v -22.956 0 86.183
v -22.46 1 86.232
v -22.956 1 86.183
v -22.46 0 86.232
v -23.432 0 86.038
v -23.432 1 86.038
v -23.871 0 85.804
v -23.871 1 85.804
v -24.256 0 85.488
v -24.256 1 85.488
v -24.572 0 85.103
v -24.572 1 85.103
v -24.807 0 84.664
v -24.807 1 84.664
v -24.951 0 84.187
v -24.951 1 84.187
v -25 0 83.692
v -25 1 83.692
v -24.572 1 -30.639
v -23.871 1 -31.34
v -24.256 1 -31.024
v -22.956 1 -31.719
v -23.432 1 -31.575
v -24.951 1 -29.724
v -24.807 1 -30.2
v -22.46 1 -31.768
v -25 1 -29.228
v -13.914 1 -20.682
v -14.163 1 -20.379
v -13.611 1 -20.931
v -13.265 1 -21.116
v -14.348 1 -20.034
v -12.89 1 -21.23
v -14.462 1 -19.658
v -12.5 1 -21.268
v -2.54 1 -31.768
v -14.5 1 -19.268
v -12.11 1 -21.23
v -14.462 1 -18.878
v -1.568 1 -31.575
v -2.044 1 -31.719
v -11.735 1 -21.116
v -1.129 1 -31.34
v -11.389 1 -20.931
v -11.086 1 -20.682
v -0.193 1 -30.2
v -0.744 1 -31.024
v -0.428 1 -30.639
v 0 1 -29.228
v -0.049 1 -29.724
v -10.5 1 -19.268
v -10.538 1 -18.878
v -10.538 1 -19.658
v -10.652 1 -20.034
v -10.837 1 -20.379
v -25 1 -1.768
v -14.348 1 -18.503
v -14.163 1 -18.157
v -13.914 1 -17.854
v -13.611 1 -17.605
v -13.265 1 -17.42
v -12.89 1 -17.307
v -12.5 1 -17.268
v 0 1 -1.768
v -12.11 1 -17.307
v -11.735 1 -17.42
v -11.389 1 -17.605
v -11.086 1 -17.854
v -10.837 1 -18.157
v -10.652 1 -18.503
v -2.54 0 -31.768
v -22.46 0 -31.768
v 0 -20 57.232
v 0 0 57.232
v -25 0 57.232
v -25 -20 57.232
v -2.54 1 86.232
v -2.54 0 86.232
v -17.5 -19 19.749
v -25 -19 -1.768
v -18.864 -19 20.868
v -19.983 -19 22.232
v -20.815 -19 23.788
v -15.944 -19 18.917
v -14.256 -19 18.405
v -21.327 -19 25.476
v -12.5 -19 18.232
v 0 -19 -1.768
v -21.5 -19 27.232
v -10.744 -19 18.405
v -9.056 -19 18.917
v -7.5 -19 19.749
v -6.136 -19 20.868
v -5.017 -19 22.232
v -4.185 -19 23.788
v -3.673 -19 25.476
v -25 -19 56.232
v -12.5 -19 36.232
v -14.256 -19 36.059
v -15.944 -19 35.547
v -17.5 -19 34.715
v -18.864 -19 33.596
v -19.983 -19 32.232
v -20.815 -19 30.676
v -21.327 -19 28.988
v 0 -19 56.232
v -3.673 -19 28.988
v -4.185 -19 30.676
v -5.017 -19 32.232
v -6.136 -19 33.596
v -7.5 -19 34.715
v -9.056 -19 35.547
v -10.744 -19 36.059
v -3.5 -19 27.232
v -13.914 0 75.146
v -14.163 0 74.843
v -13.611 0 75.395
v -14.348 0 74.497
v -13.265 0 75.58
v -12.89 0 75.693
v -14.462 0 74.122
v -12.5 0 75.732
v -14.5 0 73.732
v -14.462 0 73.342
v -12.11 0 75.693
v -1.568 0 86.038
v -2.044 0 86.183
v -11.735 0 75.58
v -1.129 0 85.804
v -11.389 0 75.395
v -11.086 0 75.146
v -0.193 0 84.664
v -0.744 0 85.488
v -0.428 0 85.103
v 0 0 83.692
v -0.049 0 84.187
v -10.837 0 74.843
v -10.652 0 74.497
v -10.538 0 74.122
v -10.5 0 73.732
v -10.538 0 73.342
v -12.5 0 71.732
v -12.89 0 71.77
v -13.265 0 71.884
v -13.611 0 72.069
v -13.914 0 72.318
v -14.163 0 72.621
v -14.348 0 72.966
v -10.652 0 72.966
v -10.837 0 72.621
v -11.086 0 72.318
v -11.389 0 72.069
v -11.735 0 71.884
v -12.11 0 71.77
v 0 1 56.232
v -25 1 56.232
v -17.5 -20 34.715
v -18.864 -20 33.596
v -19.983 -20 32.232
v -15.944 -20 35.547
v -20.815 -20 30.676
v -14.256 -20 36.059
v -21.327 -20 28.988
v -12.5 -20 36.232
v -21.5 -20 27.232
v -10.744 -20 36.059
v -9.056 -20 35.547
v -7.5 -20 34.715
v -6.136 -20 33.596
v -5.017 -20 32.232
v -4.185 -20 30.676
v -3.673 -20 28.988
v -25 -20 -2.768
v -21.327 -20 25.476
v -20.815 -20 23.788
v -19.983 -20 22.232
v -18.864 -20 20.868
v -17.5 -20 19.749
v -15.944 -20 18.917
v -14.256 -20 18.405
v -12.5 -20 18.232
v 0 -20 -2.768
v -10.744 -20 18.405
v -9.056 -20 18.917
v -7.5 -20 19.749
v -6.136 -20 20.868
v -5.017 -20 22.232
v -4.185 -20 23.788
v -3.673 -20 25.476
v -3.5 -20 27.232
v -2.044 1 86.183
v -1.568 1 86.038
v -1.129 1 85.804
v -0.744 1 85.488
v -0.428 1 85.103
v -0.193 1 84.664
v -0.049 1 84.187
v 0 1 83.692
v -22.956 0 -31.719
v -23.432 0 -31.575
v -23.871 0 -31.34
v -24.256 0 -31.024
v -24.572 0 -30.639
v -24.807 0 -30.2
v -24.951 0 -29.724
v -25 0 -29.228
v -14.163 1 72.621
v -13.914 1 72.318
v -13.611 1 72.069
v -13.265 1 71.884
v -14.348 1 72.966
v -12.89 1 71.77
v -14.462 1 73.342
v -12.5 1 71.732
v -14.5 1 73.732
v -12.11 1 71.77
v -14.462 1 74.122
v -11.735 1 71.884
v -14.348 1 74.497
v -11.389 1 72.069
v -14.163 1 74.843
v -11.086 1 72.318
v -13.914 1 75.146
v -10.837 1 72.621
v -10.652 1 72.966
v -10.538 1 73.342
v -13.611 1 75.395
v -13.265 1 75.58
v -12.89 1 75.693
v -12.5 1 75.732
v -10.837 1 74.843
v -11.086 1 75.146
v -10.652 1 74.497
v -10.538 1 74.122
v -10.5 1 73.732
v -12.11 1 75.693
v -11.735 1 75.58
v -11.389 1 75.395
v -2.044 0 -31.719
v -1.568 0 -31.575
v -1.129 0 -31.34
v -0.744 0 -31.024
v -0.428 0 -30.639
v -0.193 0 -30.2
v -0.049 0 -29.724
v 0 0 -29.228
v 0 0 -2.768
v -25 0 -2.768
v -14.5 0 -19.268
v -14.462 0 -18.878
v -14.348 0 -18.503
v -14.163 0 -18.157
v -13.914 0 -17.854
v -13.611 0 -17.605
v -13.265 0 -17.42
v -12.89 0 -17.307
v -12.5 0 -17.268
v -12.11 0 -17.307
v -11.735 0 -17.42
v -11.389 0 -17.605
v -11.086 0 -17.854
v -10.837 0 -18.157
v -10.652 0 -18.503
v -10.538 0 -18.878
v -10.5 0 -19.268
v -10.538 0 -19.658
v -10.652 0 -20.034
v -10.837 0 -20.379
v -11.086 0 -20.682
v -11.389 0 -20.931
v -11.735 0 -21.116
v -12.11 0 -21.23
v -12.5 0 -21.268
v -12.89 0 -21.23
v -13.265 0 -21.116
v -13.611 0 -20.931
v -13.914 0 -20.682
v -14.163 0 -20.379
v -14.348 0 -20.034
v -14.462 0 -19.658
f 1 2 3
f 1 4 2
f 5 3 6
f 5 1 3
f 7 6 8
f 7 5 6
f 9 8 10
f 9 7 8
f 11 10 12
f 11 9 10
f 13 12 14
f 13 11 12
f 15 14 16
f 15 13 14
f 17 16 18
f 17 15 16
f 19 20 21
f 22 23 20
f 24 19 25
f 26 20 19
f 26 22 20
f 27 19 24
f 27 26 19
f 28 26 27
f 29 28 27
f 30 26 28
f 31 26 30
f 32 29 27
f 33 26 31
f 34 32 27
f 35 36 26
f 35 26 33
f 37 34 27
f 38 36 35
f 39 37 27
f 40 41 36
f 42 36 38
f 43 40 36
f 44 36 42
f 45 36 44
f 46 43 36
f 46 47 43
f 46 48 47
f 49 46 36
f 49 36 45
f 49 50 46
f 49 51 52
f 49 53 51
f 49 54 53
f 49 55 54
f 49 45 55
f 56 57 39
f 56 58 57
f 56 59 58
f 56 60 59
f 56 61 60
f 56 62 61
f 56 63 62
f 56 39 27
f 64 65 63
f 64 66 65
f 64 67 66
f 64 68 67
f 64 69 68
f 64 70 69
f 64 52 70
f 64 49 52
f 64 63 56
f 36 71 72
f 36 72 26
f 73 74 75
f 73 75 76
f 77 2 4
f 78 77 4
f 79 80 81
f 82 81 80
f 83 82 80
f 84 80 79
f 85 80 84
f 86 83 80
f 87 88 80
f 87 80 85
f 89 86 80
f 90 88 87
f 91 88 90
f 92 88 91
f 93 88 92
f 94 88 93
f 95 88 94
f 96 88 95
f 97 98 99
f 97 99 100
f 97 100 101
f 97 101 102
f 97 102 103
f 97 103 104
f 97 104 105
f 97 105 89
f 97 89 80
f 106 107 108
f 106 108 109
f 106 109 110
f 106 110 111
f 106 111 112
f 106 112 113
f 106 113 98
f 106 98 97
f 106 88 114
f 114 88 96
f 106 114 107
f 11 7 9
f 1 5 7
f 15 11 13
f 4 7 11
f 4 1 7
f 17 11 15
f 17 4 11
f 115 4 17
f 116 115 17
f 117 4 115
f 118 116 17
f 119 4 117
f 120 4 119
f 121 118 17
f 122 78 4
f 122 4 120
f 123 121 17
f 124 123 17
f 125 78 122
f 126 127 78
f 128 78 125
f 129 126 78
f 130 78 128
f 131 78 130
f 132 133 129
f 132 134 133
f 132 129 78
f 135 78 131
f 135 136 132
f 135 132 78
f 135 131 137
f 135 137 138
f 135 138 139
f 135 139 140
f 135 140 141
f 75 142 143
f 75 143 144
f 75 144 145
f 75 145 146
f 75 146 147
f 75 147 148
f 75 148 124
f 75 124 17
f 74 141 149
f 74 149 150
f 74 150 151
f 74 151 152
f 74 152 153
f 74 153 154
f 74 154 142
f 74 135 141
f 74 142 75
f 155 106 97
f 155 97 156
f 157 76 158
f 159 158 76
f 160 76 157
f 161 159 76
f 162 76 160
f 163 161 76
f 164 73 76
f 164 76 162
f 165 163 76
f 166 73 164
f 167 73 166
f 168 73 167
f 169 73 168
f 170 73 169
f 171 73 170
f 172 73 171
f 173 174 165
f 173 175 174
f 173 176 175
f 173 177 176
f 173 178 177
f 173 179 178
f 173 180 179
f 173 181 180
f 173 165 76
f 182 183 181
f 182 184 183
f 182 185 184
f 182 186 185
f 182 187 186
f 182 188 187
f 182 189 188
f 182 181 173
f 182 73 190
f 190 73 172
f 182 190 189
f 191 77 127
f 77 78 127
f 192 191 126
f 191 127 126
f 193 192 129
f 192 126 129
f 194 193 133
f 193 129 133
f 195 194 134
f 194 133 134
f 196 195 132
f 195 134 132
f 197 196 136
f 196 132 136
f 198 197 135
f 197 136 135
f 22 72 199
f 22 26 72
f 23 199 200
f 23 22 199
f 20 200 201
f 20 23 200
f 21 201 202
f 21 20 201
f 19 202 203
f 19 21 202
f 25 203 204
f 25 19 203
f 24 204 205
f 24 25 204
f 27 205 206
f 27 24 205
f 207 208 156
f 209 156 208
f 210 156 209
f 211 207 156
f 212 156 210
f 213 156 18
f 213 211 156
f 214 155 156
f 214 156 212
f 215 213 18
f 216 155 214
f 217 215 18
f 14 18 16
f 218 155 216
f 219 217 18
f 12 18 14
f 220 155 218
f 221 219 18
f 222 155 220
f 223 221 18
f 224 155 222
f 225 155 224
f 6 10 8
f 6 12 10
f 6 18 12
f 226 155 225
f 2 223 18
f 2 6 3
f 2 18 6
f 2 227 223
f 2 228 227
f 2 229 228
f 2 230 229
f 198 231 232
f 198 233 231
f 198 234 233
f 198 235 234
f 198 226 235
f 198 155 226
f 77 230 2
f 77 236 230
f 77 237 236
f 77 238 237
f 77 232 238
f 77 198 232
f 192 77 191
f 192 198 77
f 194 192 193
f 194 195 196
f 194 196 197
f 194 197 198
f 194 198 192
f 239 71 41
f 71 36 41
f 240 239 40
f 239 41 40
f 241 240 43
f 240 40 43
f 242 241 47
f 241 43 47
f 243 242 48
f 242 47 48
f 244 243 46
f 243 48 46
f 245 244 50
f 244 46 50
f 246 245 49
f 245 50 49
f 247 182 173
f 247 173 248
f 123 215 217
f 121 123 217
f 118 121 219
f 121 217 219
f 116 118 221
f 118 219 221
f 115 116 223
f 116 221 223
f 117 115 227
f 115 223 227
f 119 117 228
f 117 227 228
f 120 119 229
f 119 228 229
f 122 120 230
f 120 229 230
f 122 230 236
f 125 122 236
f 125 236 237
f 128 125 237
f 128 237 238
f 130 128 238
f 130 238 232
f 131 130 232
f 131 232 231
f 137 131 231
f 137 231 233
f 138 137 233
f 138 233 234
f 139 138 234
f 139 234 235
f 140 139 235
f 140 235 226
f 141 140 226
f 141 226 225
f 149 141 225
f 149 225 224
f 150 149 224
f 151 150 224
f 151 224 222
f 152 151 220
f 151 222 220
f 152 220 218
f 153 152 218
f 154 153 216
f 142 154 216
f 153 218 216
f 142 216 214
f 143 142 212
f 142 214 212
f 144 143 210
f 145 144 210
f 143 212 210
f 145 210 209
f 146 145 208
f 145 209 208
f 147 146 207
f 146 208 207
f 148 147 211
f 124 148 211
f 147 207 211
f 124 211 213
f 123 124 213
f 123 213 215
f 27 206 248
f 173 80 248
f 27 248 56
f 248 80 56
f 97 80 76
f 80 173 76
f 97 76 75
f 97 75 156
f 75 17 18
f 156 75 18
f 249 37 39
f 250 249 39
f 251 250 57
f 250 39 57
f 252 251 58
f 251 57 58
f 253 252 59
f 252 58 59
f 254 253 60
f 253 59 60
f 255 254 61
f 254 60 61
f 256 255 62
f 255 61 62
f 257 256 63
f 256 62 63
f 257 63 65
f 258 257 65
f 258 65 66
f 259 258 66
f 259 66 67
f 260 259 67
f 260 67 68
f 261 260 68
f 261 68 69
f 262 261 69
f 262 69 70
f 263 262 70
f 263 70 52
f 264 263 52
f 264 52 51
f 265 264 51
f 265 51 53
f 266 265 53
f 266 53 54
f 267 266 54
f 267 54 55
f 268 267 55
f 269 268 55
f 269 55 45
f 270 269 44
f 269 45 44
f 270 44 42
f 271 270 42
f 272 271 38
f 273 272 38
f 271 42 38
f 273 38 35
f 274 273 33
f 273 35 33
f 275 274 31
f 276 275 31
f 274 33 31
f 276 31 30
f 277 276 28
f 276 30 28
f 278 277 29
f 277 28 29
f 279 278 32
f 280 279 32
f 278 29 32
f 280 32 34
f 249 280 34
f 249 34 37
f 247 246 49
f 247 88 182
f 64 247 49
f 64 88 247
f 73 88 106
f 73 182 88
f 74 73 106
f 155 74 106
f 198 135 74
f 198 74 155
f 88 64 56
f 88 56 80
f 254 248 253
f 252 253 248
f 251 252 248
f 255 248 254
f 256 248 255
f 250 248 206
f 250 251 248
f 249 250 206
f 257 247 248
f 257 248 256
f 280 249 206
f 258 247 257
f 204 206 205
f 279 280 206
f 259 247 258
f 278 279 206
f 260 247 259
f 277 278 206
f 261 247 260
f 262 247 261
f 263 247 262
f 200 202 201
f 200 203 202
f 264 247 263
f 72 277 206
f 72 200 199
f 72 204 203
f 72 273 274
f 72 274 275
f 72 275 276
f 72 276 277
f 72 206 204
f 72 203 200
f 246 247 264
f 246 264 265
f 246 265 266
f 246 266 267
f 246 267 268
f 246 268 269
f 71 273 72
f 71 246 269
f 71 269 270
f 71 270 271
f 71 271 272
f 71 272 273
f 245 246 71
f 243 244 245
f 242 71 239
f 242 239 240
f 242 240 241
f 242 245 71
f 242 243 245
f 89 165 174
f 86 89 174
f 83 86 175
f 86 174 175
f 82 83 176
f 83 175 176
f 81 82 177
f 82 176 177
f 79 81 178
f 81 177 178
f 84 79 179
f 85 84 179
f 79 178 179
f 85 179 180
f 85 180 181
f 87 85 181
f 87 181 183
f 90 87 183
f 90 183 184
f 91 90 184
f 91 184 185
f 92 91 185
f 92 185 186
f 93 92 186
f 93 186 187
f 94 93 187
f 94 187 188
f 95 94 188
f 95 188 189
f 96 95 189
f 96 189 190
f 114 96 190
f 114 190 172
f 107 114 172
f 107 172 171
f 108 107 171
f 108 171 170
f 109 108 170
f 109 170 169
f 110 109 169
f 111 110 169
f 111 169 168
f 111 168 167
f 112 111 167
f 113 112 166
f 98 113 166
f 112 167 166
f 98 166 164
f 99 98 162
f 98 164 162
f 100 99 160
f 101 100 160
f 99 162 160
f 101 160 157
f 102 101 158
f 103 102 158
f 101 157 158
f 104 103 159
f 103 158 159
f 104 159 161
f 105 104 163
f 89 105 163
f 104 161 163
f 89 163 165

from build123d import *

# Parameters (mm, degrees)
F1_DEPTH = 25.0000008
F2_R     = 2.54
F4_D     = 18
F6_D     = 4


with BuildPart() as f1:
    # F0 (on Right) → F1 (new body)
    with BuildSketch(Plane.YZ):
        Polygon((1, 86.2317622141), (0, 86.2317622141), (0, 57.2317622141), (-20, 57.2317622141), (-20, -2.7682377859), (0, -2.7682377859), (0, -31.7682377859), (1, -31.7682377859), (1, -1.7682377859), (-19, -1.7682377859), (-19, 56.2317622141), (1, 56.2317622141), align=None)
    extrude(amount=-F1_DEPTH)

    # F2
    f2_edges = [f1.edges().sort_by_distance(p)[0] for p in [
        (0, 0.5, 86.231762),
        (-25.000001, 0.5, 86.231762),
        (0, 0.5, -31.768238),
        (-25.000001, 0.5, -31.768238),
    ]]
    fillet(f2_edges, radius=F2_R)

    # F4 (through all)
    with Locations(Plane(origin=(0, 0, 0), x_dir=(1, 0, 0), z_dir=(0, 1, 0))):
        with Locations((-12.5000008, -27.2317622141)):
            Hole(F4_D / 2)

    # F6 (through all)
    with Locations(Plane.XZ):
        with Locations((-12.5000008, 73.7317622141), (-12.5, -19.2682377859)):
            Hole(F6_D / 2)


solid = f1.part
